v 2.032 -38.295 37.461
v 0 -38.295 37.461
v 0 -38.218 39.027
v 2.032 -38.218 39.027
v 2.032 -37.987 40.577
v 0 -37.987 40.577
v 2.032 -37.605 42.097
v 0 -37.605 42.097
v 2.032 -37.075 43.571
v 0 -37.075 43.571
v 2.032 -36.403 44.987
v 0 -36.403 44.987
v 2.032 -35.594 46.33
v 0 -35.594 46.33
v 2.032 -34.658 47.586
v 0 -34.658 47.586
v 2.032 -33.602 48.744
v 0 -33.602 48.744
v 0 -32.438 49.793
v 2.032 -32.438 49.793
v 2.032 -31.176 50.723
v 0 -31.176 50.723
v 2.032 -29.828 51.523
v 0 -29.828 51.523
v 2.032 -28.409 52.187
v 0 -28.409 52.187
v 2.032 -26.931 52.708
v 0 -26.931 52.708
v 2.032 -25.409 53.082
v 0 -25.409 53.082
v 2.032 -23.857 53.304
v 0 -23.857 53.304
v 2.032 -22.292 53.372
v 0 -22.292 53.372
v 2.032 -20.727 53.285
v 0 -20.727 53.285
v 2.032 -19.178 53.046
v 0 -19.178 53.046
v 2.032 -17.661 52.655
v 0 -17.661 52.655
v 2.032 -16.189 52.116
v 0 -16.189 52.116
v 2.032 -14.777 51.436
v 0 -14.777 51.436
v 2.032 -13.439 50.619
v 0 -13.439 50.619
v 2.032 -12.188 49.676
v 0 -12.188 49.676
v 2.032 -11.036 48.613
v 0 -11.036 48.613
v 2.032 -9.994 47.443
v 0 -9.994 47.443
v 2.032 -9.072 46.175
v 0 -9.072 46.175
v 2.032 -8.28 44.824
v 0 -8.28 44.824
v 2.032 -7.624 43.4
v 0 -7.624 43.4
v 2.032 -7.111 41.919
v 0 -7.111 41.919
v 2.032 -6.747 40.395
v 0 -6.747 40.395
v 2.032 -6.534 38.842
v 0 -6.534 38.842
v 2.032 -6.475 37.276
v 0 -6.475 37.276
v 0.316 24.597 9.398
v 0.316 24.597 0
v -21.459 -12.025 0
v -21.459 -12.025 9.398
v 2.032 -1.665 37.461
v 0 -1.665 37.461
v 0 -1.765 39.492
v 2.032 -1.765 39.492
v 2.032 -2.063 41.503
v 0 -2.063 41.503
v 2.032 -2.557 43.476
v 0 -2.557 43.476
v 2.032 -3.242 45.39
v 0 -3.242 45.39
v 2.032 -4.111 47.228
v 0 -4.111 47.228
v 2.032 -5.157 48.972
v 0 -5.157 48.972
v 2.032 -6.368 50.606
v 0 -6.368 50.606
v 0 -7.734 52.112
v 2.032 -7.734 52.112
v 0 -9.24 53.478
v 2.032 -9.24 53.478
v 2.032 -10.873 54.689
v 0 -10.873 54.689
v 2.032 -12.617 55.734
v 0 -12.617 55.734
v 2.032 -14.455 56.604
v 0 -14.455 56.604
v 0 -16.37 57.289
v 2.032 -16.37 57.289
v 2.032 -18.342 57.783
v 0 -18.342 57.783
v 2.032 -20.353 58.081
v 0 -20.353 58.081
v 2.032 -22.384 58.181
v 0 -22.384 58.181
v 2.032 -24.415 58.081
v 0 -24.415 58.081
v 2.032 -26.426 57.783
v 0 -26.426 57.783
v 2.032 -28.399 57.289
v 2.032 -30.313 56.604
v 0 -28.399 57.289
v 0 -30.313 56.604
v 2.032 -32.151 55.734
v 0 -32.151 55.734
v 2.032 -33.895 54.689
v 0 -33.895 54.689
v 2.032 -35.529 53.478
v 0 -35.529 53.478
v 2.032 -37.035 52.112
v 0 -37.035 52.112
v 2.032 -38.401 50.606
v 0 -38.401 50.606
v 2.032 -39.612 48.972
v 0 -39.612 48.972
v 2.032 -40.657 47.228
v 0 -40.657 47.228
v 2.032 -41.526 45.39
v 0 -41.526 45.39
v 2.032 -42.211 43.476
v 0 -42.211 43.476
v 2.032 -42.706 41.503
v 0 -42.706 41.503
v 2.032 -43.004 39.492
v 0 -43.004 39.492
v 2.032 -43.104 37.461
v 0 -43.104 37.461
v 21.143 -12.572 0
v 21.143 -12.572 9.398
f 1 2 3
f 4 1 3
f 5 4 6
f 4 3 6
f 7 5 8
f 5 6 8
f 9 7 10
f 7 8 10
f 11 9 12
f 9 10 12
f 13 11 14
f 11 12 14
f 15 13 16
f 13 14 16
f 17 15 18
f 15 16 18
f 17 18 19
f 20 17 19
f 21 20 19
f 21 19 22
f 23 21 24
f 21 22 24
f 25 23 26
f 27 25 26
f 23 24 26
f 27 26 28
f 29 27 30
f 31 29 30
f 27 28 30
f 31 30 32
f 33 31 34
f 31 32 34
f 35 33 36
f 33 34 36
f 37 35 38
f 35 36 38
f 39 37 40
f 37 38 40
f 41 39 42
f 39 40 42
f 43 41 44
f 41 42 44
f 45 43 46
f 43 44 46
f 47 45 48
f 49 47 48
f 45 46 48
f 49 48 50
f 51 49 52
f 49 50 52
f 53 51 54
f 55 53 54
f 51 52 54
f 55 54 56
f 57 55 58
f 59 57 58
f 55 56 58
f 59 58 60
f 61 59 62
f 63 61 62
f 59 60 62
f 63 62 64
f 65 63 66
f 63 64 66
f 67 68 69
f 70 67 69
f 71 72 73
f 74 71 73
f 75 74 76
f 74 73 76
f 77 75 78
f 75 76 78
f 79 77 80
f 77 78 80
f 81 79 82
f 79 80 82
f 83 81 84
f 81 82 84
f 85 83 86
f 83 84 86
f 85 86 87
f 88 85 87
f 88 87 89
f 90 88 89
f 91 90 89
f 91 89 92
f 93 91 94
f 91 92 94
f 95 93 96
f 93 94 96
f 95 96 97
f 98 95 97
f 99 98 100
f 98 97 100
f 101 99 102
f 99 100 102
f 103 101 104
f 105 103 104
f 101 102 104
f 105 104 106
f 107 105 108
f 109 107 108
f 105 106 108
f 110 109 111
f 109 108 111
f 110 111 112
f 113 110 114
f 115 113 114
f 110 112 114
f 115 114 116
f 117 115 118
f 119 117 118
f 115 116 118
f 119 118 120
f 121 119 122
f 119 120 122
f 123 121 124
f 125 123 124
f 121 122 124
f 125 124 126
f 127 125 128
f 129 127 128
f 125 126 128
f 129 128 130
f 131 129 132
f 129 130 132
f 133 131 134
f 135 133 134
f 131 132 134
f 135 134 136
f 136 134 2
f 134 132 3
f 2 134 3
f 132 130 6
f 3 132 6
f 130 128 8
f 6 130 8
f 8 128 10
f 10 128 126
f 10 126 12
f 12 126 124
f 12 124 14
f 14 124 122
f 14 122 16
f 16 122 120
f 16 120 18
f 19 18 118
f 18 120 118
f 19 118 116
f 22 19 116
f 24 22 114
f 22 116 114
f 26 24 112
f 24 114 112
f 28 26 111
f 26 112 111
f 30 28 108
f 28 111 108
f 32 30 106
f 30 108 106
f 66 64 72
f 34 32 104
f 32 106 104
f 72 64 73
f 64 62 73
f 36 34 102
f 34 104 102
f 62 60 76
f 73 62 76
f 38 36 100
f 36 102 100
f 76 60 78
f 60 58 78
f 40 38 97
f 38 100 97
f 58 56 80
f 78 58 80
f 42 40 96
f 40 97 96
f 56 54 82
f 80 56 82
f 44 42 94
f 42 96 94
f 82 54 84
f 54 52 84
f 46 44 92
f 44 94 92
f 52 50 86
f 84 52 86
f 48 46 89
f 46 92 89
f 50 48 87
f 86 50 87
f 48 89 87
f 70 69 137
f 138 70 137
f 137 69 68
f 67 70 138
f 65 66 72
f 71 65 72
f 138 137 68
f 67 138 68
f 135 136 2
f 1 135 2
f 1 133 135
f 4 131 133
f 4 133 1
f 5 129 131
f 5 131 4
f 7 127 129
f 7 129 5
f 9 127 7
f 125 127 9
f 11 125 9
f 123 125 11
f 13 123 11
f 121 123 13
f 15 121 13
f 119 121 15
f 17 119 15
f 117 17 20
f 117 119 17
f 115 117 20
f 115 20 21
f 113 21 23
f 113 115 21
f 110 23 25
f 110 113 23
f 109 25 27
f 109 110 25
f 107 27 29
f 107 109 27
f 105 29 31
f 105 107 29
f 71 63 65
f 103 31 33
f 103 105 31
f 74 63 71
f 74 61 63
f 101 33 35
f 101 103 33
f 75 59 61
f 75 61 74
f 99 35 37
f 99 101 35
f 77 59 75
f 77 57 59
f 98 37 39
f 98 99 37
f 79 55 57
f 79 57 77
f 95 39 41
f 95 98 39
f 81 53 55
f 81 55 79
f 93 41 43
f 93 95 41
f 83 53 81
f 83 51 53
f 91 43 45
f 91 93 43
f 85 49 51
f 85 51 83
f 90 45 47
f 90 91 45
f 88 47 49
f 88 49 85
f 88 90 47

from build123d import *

# Parameters (mm, degrees)
F1_DEPTH = 9.398
F3_DEPTH = 2.032


with BuildPart() as f1:
    # F0 (on Top) → F1 (new body)
    with BuildSketch(Plane.XY):
        Polygon((21.143296, -12.572014), (0.316036, 24.596639), (-21.459332, -12.024624), align=None)
    extrude(amount=F1_DEPTH)


with BuildPart() as f3:
    # F2 (on Right) → F3 (new body)
    with BuildSketch(Plane.YZ):
        with BuildLine():
            ThreePointArc((-38.294881, 37.461329), (-22.291801, 53.371642), (-6.474794, 37.276335))
            Line((-6.474794, 37.276335), (-1.664949, 37.461329))
            ThreePointArc((-1.664949, 37.461329), (-22.3843, 58.18068), (-43.103651, 37.461329))
            Line((-43.103651, 37.461329), (-38.294881, 37.461329))
        make_face()
    extrude(amount=F3_DEPTH)


solid = Compound([f1.part, f3.part])
